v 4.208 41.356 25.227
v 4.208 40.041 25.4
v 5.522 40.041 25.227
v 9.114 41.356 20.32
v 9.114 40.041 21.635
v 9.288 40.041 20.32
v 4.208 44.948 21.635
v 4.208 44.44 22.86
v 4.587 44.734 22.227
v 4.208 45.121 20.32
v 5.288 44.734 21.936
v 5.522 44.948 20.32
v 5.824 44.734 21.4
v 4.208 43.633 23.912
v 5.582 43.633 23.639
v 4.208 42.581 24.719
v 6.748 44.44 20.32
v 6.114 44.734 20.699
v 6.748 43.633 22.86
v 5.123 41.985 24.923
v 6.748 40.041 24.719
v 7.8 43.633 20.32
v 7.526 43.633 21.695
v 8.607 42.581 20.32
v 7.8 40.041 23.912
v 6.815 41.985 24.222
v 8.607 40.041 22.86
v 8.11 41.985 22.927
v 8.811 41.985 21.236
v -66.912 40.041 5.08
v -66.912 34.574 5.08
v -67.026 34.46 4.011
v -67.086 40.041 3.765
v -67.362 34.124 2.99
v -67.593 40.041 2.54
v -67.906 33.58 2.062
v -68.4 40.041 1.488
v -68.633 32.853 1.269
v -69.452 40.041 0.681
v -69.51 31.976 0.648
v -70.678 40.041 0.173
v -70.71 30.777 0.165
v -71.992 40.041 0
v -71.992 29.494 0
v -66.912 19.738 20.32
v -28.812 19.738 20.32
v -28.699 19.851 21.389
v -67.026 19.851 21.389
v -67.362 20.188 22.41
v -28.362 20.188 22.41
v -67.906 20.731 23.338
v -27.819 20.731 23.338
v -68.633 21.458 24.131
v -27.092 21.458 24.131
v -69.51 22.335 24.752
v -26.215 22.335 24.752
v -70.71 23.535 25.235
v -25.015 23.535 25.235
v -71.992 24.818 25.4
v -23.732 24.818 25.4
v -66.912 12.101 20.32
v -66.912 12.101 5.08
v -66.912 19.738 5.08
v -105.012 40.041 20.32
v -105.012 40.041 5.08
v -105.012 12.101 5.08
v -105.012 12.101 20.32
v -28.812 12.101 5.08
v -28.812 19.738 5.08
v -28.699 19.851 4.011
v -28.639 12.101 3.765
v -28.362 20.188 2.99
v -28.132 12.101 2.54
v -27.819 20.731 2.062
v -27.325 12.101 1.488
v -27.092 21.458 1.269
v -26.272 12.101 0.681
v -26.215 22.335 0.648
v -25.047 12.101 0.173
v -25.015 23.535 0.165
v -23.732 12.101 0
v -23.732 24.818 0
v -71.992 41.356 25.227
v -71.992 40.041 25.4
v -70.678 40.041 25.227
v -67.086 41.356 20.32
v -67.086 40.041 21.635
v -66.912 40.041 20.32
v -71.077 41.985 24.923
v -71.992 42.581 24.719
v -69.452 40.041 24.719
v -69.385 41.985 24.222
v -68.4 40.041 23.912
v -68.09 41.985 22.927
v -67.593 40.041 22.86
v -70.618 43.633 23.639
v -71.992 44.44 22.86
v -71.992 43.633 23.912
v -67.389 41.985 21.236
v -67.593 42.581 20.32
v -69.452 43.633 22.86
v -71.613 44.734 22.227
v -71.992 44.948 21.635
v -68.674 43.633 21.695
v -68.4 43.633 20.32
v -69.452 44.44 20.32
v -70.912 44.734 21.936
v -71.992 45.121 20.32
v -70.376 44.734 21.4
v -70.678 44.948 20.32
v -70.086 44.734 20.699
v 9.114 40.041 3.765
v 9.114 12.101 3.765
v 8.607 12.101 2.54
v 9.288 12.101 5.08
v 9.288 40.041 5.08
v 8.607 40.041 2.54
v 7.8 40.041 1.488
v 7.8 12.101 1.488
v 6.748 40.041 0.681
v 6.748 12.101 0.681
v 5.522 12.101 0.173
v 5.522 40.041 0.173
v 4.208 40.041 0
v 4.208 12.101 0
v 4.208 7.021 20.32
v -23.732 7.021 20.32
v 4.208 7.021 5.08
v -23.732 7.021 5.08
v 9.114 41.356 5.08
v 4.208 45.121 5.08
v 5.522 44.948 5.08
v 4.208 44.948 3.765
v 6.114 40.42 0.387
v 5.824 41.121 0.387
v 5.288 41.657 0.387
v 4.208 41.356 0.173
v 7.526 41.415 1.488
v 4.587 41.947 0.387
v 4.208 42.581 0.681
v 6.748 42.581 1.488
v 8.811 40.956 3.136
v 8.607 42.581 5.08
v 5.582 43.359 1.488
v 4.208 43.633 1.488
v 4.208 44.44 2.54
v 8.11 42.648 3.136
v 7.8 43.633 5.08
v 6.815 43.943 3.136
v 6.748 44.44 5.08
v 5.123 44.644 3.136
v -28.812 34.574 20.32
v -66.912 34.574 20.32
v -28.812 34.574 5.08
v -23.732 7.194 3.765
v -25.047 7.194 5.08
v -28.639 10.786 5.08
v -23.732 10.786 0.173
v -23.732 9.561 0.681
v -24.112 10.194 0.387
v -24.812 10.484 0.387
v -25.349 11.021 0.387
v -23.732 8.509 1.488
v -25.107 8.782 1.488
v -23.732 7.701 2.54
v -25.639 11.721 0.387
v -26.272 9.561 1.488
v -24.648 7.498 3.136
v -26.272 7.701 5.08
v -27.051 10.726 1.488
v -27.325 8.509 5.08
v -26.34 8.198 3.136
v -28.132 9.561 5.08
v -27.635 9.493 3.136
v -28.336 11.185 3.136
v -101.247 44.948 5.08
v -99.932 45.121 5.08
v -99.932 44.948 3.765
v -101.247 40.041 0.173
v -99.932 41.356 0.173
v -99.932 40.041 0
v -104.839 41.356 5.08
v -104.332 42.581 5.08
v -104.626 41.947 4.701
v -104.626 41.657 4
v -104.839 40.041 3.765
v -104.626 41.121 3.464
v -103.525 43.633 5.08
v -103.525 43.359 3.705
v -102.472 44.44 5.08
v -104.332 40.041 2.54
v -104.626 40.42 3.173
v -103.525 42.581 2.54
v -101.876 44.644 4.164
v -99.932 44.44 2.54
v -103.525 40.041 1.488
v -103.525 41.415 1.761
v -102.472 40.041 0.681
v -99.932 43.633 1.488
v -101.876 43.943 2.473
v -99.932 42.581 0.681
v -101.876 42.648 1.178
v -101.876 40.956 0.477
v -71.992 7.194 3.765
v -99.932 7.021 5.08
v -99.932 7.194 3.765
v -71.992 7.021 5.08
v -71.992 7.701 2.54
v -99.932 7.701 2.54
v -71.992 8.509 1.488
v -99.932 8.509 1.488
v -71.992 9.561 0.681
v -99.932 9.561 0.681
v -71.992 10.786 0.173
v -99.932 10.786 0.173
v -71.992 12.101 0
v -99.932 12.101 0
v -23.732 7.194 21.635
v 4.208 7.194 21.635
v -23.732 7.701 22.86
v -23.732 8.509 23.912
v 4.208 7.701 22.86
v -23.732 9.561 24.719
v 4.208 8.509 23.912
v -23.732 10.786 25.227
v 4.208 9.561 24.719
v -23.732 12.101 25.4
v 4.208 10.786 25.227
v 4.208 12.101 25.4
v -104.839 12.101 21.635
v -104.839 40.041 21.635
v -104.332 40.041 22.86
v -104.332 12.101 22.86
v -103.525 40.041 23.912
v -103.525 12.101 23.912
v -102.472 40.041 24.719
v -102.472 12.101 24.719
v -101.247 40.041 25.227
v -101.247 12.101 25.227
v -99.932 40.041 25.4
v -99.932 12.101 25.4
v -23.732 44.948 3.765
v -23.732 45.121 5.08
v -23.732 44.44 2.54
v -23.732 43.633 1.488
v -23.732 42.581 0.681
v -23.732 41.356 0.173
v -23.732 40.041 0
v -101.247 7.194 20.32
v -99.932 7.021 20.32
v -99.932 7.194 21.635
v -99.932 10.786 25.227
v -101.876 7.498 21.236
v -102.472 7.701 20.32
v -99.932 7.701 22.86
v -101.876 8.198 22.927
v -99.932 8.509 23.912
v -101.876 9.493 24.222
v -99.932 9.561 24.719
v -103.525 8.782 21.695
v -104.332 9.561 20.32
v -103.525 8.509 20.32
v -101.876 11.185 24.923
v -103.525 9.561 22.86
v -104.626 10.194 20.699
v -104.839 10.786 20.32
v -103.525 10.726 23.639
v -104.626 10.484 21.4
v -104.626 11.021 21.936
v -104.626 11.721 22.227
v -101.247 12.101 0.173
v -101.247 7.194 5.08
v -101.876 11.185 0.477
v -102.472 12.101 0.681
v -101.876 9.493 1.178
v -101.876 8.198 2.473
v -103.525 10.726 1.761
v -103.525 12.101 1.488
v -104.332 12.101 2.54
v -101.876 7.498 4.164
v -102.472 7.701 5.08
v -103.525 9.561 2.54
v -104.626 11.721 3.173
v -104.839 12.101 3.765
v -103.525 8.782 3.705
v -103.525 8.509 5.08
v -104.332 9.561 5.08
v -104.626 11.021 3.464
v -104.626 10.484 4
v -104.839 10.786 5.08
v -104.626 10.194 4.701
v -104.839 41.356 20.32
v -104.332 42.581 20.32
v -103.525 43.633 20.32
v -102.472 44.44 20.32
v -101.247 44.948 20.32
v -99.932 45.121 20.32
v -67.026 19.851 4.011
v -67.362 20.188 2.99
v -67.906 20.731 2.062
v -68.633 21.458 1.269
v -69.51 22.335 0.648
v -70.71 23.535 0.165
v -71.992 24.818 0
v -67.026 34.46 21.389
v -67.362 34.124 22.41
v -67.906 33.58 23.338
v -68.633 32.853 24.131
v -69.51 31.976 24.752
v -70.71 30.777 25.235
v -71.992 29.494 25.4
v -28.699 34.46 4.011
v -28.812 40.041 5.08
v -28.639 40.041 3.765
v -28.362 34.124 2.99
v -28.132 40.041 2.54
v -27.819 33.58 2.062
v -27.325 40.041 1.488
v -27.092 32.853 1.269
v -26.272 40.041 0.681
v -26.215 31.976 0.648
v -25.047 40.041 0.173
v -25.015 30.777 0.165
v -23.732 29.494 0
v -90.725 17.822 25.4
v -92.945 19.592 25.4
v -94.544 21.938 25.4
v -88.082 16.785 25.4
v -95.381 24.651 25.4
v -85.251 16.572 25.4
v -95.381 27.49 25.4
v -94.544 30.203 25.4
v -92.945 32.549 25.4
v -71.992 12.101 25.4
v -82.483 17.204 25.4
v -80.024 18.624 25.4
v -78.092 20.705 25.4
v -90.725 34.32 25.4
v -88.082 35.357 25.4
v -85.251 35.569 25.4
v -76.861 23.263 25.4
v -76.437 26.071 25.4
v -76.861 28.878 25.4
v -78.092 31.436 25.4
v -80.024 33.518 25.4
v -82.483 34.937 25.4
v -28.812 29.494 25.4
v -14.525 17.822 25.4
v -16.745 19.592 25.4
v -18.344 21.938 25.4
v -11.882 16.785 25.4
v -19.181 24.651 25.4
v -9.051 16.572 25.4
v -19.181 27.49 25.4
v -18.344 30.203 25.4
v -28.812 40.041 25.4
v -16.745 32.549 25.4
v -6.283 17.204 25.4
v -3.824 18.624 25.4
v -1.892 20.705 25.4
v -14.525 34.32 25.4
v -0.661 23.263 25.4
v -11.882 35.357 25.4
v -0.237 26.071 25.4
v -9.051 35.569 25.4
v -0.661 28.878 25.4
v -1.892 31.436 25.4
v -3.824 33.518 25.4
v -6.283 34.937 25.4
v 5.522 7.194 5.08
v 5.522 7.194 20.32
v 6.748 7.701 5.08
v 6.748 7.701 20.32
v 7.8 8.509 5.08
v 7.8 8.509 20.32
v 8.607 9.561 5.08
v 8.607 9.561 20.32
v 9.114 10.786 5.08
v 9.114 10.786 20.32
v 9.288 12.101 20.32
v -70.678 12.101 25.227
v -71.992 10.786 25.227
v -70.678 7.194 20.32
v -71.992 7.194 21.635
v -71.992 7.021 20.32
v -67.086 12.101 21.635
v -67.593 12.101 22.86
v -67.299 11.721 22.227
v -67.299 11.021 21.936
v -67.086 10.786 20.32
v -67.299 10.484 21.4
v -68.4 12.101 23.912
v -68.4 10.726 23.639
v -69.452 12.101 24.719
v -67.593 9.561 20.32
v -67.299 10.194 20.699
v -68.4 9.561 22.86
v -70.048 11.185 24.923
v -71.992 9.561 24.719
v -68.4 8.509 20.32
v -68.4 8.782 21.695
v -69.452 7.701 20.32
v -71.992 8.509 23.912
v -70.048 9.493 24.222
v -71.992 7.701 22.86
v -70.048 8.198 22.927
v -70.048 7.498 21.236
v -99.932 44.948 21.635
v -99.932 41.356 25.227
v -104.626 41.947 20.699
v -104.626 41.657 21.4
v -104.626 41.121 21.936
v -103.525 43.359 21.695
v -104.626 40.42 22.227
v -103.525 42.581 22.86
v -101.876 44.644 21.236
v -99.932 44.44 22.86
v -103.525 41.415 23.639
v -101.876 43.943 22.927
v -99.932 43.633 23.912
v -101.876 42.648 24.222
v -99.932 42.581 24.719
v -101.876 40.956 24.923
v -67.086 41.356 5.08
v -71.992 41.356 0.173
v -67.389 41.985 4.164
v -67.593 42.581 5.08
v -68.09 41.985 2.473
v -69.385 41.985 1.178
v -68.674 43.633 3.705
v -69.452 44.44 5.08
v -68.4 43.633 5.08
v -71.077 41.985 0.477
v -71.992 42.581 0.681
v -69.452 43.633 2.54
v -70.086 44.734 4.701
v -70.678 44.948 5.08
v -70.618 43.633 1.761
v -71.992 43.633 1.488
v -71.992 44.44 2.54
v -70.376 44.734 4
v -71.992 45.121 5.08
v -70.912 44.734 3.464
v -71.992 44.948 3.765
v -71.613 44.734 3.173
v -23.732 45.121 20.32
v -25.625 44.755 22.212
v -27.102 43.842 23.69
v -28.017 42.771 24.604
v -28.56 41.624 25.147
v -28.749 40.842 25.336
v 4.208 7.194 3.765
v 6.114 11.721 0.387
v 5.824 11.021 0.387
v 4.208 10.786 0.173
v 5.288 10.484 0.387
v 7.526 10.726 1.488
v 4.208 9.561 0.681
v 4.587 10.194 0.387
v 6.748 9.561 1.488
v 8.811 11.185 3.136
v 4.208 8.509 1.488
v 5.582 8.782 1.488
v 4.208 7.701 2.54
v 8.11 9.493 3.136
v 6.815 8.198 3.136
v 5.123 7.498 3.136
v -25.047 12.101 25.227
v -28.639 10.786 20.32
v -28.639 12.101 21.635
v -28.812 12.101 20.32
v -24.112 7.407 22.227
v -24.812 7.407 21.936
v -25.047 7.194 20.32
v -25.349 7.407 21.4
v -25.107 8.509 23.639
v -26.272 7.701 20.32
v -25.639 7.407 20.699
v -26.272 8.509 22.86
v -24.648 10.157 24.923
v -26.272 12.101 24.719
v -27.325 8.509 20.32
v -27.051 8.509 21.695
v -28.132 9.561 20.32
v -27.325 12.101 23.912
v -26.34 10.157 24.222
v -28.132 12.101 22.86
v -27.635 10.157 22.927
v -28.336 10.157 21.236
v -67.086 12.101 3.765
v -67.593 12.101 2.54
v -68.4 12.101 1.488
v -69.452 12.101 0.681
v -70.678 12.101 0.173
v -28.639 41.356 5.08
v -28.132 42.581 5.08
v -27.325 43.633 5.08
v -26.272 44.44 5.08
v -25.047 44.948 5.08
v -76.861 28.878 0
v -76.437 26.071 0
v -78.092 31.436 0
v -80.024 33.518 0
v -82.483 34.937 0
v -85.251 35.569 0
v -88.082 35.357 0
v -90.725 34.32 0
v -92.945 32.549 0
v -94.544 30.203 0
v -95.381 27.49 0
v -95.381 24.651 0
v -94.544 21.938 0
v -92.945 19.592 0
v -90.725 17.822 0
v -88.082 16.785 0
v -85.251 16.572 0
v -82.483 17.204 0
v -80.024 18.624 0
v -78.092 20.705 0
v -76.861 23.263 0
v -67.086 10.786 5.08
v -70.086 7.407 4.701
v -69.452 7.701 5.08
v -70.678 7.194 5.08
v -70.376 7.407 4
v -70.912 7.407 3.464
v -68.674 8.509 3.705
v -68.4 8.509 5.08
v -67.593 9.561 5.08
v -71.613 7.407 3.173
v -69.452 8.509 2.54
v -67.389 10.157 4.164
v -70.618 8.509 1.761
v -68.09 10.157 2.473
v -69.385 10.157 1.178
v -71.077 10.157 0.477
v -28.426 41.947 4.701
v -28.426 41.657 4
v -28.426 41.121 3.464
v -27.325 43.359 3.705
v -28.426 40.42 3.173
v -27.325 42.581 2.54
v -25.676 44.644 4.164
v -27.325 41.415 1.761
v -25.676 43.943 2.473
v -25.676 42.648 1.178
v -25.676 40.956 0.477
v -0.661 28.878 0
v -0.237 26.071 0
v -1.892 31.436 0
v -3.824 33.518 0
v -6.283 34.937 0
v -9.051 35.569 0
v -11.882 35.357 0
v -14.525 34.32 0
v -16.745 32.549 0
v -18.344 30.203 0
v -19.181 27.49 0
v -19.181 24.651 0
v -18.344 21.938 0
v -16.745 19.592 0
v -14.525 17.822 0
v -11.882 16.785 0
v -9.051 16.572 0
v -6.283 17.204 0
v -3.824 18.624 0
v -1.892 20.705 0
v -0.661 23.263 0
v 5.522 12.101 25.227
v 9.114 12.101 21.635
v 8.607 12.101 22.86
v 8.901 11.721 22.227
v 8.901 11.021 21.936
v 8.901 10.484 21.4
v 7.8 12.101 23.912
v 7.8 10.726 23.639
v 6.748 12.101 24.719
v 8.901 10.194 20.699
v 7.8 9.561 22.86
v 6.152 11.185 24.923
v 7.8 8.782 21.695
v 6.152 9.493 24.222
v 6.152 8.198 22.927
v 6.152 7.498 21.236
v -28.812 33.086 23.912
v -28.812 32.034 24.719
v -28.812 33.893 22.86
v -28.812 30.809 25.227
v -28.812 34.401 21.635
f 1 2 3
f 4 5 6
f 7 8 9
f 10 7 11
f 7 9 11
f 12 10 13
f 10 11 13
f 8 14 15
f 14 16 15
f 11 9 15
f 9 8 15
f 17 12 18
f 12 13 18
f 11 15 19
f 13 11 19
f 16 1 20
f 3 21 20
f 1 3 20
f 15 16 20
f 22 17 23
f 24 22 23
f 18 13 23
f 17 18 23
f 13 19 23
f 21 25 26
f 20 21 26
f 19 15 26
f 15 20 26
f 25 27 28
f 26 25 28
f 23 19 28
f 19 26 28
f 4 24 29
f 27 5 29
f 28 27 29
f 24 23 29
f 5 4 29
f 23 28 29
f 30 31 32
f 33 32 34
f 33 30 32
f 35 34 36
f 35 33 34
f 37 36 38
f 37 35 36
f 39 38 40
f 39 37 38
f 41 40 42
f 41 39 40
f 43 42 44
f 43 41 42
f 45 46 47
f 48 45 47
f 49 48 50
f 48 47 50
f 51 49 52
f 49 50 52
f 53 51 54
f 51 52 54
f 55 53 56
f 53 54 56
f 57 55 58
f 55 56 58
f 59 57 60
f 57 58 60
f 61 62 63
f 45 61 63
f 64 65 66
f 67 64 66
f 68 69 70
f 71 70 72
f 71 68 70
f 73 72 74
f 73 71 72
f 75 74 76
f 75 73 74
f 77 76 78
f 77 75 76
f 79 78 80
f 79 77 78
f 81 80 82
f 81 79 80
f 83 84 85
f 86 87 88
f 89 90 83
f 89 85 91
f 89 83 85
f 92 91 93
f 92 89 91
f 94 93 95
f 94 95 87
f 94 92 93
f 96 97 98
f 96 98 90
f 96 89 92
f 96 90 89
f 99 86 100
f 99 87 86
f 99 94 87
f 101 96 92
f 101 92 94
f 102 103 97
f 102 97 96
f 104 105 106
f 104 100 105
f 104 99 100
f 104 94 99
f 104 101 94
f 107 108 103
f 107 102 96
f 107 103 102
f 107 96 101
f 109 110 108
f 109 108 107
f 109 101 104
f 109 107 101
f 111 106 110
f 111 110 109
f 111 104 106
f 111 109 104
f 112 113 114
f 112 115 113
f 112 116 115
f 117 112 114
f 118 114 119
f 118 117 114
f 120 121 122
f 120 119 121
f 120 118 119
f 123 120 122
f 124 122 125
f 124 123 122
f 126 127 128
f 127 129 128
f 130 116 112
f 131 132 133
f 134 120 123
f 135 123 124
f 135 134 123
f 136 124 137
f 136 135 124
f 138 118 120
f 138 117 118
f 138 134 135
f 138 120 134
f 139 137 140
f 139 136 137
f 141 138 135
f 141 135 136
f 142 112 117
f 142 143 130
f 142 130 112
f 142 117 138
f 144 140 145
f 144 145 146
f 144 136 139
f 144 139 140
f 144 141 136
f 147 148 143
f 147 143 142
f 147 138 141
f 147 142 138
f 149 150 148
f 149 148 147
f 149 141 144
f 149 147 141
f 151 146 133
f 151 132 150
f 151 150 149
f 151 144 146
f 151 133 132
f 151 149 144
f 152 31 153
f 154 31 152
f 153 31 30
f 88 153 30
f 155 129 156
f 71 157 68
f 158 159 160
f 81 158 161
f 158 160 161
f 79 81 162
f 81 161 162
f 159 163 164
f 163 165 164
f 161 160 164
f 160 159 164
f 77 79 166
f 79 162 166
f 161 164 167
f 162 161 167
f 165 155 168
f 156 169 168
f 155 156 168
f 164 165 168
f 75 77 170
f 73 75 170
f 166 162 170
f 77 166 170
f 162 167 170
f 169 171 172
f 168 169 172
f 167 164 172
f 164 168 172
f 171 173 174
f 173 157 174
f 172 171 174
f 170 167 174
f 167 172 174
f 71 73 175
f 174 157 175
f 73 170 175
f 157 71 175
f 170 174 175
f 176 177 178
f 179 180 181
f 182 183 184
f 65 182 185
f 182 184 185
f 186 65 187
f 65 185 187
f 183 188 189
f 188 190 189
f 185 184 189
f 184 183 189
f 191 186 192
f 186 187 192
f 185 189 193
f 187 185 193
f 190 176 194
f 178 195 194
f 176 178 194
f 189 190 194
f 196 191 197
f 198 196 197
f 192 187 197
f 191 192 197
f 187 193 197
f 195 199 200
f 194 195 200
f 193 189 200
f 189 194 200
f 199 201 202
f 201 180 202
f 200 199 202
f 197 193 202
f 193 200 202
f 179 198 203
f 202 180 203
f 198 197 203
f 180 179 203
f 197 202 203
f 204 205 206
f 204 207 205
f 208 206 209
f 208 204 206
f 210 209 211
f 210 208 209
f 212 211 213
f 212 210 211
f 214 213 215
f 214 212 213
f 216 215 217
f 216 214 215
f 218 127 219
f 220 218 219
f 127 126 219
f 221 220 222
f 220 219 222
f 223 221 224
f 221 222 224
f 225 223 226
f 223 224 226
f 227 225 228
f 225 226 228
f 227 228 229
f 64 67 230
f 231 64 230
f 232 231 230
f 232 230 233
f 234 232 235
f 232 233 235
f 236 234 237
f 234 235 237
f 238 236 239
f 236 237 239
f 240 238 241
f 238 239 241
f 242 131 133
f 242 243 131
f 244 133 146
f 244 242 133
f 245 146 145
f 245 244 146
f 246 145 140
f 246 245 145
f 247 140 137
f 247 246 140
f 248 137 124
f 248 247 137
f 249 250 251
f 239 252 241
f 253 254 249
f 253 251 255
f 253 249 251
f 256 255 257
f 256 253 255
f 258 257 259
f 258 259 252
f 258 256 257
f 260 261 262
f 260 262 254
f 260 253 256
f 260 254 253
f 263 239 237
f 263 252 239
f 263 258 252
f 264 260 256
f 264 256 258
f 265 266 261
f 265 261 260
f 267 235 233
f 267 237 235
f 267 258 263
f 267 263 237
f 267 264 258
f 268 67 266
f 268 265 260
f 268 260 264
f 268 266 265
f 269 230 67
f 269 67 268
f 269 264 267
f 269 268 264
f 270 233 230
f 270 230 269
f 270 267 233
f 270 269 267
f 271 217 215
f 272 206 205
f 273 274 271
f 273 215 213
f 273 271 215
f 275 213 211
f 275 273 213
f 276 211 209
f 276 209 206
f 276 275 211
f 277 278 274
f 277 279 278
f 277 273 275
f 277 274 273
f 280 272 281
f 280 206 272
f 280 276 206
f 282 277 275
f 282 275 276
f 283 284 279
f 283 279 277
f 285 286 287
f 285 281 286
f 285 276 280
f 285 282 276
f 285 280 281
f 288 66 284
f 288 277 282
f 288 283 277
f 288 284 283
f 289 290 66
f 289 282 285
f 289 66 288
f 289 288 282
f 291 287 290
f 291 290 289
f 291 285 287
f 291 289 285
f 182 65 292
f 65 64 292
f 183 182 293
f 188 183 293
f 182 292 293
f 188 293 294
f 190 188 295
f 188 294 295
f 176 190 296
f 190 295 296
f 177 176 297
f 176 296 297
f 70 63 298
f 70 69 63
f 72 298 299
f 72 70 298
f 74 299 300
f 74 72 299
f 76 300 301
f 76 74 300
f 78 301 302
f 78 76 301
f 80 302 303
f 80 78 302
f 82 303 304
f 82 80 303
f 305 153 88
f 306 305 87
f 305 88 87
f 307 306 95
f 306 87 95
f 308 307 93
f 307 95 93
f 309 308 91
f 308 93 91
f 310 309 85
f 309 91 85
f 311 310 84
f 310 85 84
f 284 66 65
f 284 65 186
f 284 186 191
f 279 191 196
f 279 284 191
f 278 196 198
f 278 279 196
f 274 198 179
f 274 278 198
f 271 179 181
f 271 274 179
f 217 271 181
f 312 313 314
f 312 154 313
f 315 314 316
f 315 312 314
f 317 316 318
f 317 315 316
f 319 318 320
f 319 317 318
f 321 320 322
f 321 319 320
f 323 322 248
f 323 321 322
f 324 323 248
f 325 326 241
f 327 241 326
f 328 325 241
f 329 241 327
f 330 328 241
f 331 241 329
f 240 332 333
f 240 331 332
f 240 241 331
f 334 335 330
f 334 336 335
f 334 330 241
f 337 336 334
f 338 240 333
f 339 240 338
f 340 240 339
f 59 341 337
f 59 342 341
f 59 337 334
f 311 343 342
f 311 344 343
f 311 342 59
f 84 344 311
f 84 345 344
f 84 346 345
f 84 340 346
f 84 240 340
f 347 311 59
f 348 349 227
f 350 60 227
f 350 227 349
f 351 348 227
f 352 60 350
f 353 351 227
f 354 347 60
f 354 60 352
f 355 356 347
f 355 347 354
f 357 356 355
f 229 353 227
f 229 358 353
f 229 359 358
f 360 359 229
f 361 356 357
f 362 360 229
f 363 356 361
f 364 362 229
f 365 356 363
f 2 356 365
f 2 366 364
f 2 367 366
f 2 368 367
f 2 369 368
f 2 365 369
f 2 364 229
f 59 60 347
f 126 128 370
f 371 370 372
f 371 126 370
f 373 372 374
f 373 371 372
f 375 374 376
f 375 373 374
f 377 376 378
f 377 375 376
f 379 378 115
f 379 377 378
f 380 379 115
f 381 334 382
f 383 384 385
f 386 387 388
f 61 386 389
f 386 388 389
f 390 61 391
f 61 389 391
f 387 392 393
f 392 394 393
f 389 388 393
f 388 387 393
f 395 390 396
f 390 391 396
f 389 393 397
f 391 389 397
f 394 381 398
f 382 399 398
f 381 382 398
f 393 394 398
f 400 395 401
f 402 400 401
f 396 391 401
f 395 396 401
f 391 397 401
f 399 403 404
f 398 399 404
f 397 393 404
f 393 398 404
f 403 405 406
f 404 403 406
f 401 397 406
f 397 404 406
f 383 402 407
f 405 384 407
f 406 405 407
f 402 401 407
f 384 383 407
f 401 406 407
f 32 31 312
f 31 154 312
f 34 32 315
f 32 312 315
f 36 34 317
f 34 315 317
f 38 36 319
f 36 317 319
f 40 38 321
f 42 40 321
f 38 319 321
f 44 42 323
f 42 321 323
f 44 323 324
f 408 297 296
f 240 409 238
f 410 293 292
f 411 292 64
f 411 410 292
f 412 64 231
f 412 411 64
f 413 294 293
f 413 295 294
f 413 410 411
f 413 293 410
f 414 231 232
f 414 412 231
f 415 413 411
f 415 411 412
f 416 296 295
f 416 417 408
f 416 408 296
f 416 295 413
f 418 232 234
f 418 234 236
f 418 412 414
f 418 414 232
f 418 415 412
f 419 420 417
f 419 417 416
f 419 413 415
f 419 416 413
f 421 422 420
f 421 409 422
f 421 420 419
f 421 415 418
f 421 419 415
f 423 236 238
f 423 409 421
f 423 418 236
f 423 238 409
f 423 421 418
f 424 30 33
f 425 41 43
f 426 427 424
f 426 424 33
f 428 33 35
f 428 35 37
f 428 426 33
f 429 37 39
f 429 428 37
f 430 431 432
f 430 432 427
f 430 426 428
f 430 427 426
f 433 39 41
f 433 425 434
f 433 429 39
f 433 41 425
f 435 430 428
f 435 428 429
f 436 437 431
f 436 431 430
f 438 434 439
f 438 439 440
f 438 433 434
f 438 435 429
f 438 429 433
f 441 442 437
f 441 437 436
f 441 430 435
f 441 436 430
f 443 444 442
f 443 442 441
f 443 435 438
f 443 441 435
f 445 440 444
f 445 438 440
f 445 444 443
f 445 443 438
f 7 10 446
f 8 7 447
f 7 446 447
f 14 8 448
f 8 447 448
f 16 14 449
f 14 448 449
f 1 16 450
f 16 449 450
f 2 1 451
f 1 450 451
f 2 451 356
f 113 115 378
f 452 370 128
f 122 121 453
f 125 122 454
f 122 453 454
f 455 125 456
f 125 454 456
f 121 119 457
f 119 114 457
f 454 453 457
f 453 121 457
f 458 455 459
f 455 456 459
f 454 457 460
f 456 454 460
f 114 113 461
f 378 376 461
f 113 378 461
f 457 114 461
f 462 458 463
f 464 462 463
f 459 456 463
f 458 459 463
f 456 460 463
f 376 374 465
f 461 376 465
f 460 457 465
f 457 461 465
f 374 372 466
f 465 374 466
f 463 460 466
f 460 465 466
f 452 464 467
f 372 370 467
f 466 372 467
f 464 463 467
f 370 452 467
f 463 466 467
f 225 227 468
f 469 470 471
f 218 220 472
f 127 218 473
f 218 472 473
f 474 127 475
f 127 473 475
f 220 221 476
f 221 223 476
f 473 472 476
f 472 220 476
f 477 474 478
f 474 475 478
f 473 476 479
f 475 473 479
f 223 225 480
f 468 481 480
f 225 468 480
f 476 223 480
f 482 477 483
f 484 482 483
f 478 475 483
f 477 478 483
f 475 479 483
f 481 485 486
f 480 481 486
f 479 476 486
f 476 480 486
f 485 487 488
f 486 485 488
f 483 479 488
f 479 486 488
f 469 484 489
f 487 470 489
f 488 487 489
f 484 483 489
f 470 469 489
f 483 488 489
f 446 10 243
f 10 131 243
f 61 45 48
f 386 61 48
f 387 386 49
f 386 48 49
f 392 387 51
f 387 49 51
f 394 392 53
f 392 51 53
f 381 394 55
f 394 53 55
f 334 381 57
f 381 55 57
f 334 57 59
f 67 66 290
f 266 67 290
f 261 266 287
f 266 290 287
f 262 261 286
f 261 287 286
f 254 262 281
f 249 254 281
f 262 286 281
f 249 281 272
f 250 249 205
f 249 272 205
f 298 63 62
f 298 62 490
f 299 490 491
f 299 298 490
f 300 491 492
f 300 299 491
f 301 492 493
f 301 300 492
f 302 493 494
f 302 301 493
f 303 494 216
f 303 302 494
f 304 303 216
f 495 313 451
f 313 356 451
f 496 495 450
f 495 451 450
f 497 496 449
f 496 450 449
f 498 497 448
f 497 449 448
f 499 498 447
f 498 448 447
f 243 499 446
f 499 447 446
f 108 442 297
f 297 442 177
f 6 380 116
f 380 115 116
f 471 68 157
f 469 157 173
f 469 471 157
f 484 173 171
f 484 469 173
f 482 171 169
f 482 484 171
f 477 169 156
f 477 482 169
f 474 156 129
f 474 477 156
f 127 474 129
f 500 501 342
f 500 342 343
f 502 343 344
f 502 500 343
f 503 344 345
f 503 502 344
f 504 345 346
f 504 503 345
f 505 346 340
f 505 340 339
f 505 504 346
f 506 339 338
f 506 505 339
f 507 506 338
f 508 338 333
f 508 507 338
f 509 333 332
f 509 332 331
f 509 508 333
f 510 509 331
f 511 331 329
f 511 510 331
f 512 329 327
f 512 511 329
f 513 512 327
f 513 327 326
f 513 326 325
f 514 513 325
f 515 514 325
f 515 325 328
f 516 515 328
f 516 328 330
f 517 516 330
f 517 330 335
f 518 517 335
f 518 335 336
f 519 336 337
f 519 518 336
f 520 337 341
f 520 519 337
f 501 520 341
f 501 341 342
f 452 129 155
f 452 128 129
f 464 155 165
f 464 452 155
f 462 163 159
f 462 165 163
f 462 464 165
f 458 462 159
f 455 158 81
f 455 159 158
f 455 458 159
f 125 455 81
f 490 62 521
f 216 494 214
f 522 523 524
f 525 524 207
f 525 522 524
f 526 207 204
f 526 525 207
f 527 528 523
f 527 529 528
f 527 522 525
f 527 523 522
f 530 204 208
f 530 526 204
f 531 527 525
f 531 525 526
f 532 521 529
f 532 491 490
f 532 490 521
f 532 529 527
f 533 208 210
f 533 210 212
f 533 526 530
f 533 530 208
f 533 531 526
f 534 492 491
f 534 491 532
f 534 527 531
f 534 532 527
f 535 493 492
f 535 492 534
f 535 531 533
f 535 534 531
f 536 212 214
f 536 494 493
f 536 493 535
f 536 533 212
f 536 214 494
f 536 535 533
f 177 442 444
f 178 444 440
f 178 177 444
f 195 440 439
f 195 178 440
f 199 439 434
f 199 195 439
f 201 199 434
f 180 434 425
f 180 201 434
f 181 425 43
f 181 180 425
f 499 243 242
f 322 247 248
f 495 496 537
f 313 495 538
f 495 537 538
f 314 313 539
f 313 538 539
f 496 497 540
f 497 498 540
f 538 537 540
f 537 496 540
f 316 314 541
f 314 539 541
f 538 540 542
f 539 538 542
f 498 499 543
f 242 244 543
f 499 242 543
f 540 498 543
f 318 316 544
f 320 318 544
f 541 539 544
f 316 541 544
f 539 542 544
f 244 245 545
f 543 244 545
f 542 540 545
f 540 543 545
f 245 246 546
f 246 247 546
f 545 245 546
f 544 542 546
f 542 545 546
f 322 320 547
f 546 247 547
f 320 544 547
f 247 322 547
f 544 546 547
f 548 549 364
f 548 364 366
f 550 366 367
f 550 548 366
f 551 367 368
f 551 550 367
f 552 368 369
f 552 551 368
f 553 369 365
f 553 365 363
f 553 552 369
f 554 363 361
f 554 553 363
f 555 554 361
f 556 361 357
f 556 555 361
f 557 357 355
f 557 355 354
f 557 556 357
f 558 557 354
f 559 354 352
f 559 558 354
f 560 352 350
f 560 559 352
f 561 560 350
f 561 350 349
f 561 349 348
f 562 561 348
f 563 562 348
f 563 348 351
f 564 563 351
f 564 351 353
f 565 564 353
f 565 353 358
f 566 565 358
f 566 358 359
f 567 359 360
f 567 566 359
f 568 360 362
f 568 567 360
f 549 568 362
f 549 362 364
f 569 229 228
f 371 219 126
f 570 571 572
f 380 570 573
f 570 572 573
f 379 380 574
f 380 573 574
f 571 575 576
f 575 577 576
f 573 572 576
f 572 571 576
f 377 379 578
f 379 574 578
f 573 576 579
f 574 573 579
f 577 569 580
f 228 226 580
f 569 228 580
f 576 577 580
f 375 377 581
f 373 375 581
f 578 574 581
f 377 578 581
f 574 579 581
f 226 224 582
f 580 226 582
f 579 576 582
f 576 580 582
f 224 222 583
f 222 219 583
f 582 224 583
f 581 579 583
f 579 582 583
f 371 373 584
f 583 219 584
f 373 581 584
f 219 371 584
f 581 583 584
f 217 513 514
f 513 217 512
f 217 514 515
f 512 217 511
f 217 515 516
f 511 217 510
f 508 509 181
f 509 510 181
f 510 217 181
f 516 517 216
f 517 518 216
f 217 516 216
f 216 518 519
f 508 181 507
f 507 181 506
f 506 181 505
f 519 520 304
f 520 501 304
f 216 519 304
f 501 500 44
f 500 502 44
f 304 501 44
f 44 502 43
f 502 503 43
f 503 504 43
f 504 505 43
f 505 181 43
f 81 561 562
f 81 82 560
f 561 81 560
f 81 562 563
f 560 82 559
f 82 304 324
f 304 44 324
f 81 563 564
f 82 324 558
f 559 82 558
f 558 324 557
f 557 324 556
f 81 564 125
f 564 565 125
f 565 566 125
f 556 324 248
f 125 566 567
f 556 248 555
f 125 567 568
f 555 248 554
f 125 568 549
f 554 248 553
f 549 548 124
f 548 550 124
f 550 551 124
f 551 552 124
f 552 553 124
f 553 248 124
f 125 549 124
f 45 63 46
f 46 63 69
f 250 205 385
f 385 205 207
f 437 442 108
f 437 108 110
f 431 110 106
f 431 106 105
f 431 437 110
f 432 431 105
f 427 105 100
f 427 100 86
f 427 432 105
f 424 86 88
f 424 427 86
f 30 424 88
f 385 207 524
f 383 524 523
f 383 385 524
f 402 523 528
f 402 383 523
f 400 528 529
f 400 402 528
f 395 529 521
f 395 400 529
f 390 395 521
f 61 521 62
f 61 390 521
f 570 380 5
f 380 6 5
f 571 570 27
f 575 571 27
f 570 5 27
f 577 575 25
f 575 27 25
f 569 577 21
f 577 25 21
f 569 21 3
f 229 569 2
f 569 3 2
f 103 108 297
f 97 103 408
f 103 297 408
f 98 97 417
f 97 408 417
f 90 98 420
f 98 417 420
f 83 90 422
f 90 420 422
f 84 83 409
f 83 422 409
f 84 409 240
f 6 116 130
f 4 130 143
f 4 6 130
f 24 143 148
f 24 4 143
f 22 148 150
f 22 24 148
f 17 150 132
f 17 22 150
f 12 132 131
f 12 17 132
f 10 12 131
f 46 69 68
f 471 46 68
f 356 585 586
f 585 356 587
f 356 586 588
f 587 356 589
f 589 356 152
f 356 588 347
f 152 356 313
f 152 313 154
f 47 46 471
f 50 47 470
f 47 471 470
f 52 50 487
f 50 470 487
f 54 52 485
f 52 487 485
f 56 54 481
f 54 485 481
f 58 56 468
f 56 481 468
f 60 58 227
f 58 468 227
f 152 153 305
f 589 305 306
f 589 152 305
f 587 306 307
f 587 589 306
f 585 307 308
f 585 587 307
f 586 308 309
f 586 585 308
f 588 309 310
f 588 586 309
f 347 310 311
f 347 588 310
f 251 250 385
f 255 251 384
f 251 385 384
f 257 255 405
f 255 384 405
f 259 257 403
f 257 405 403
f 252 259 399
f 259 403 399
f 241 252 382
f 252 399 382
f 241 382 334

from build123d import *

# Parameters (mm, degrees)
F0_R         = 9.525
F0_W         = 38.1
F0_H         = 14.8362964392
F1_DEPTH     = 25.4
F2_R         = 5.08
F3_T1_DEPTH  = 15.24
F3_S5_W      = 5.08
F3_S5_H      = 5.08
F3_T6_DEPTH  = 5.08
F3_S11_W     = 5.08
F3_S11_H     = 5.08
F3_T12_DEPTH = 5.08
F3_S17_W     = 5.08
F3_S17_H     = 5.08
F3_T18_DEPTH = 5.08
F3_S23_W     = 5.08
F3_S23_H     = 5.08
F3_T24_DEPTH = 5.08


# Not quite as in the source:
# - a fillet or chamfer that OpenCascade refuses, or shapes differently, is made with other operations: its cross-section is extruded or revolved along the edge and cut away or added


with BuildPart() as f1:
    # F0 (on Top) → F1 (new body)
    with BuildSketch(Plane.XY):
        Polygon((-105.0124109644, 7.0207449608), (-66.9124109644, 7.0207449608), (-66.9124109644, 19.73756589), (-66.9124109644, 34.5738623291), (-66.9124109644, 45.1207449608), (-105.0124109644, 45.1207449608), align=None)
        with Locations((-85.9624109644, 26.0707449608)):
            Circle(F0_R, mode=Mode.SUBTRACT)
        with Locations((-47.8624109644, 27.1557141095)):
            Rectangle(F0_W, F0_H)
        Polygon((-28.8124109644, 34.5738623291), (-28.8124109644, 19.73756589), (-28.8124109644, 7.0207449608), (9.2875890356, 7.0207449608), (9.2875890356, 45.1207449608), (-28.8124109644, 45.1207449608), align=None)
        with Locations((-9.7624109644, 26.0707449608)):
            Circle(F0_R, mode=Mode.SUBTRACT)
    extrude(amount=F1_DEPTH)

    # F2
    f2_edges = [f1.edges().sort_by_distance(p)[0] for p in [
        (-85.962411, 45.120745, 25.4),
        (-85.962411, 45.120745, 0),
        (-105.012411, 45.120745, 12.7),
        (-105.012411, 26.070745, 0),
        (-105.012411, 26.070745, 25.4),
        (-85.962411, 7.020745, 25.4),
        (-47.862411, 19.737566, 25.4),
        (-47.862411, 34.573862, 25.4),
        (-66.912411, 39.847304, 25.4),
        (-66.912411, 13.379155, 25.4),
        (-28.812411, 13.379155, 25.4),
        (-9.762411, 7.020745, 25.4),
        (9.287589, 26.070745, 25.4),
        (-9.762411, 45.120745, 25.4),
        (9.287589, 7.020745, 12.7),
        (9.287589, 45.120745, 12.7),
        (9.287589, 26.070745, 0),
        (-47.862411, 19.737566, 0),
        (-66.912411, 13.379155, 0),
        (-66.912411, 7.020745, 12.7),
        (-28.812411, 7.020745, 12.7),
        (-85.962411, 7.020745, 0),
        (-47.862411, 34.573862, 0),
        (-9.762411, 45.120745, 0),
        (-28.812411, 45.120745, 12.7),
        (-28.812411, 39.847304, 0),
        (-66.912411, 39.847304, 0),
        (-9.762411, 7.020745, 0),
        (-28.812411, 13.379155, 0),
    ]]
    fillet(f2_edges, radius=F2_R)

    # F3: fillet of radius 5.08 on 2 edges, made by hand

    # F3_s2 → F3_t1 (cut)
    with BuildSketch(Plane.XY.offset(5.08)):
        with BuildLine():
            ThreePointArc((-71.9924109644, 45.1207449608), (-68.4003085159, 43.6328474092), (-66.9124109644, 40.0407449608))
            Line((-66.9124109644, 40.0407449608), (-66.9124109644, 45.1207449608))
            Line((-66.9124109644, 45.1207449608), (-71.9924109644, 45.1207449608))
        make_face()
        with BuildLine():
            ThreePointArc((-105.0124109644, 12.1007449608), (-103.5245134128, 8.5086425123), (-99.9324109644, 7.0207449608))
            Line((-99.9324109644, 7.0207449608), (-105.0124109644, 7.0207449608))
            Line((-105.0124109644, 7.0207449608), (-105.0124109644, 12.1007449608))
        make_face()
    extrude(amount=F3_T1_DEPTH, mode=Mode.SUBTRACT)


with BuildPart() as f3_tool4:
    # F3_s5 → F3_t6 (new body)
    with BuildSketch(Plane.YZ.offset(-99.9324109644)):
        with Locations((9.5607449608, 2.54)):
            Rectangle(F3_S5_W, F3_S5_H)
    extrude(amount=-F3_T6_DEPTH)

    # F3_s7 → F3_t8 (revolve, cut)
    with BuildSketch(Plane(origin=(-99.9324109644, 12.1007449608, 5.08), x_dir=(0, 0.7071067812, 0.7071067812), z_dir=(0, -0.7071067812, 0.7071067812))):
        with BuildLine():
            ThreePointArc((0, -5.08), (5.08, 0), (0, 5.08))
            Line((0, 5.08), (0, -5.08))
        make_face()
    revolve(axis=Axis((-99.9324109644, 12.1007449608, 5.08), (-1, 0, 0)), mode=Mode.SUBTRACT)


with BuildPart() as f1_1:
    add(f1.part)

    # F3_t3: cut F3_tool4
    add(f3_tool4.part, mode=Mode.SUBTRACT)


with BuildPart() as f3_tool10:
    # F3_s11 → F3_t12 (new body)
    with BuildSketch(Plane.YZ.offset(-99.9324109644)):
        with Locations((9.5607449608, 22.86)):
            Rectangle(F3_S11_W, F3_S11_H)
    extrude(amount=-F3_T12_DEPTH)

    # F3_s13 → F3_t14 (revolve, cut)
    with BuildSketch(Plane(origin=(-99.9324109644, 12.1007449608, 20.32), x_dir=(0, 0.7071067812, -0.7071067812), z_dir=(0, 0.7071067812, 0.7071067812))):
        with BuildLine():
            ThreePointArc((0, -5.08), (5.08, 0), (0, 5.08))
            Line((0, 5.08), (0, -5.08))
        make_face()
    revolve(axis=Axis((-99.9324109644, 12.1007449608, 20.32), (-1, 0, 0)), mode=Mode.SUBTRACT)


with BuildPart() as f1_2:
    add(f1_1.part)

    # F3_t9: cut F3_tool10
    add(f3_tool10.part, mode=Mode.SUBTRACT)


with BuildPart() as f3_tool16:
    # F3_s17 → F3_t18 (new body)
    with BuildSketch(Plane.XZ.offset(-40.0407449608)):
        with Locations((-69.4524109644, 2.54)):
            Rectangle(F3_S17_W, F3_S17_H)
    extrude(amount=-F3_T18_DEPTH)

    # F3_s19 → F3_t20 (revolve, cut)
    with BuildSketch(Plane(origin=(-71.9924109644, 40.0407449608, 5.08), x_dir=(-0.7071067812, 0, 0.7071067812), z_dir=(-0.7071067812, 0, -0.7071067812))):
        with BuildLine():
            ThreePointArc((0, -5.08), (5.08, 0), (0, 5.08))
            Line((0, 5.08), (0, -5.08))
        make_face()
    revolve(axis=Axis((-71.9924109644, 40.0407449608, 5.08), (0, 1, 0)), mode=Mode.SUBTRACT)


with BuildPart() as f1_3:
    add(f1_2.part)

    # F3_t15: cut F3_tool16
    add(f3_tool16.part, mode=Mode.SUBTRACT)


with BuildPart() as f3_tool22:
    # F3_s23 → F3_t24 (new body)
    with BuildSketch(Plane.XZ.offset(-40.0407449608)):
        with Locations((-69.4524109644, 22.86)):
            Rectangle(F3_S23_W, F3_S23_H)
    extrude(amount=-F3_T24_DEPTH)

    # F3_s25 → F3_t26 (revolve, cut)
    with BuildSketch(Plane(origin=(-71.9924109644, 40.0407449608, 20.32), x_dir=(-0.7071067812, 0, -0.7071067812), z_dir=(0.7071067812, 0, -0.7071067812))):
        with BuildLine():
            ThreePointArc((0, -5.08), (5.08, 0), (0, 5.08))
            Line((0, 5.08), (0, -5.08))
        make_face()
    revolve(axis=Axis((-71.9924109644, 40.0407449608, 20.32), (0, 1, 0)), mode=Mode.SUBTRACT)


with BuildPart() as f1_4:
    add(f1_3.part)

    # F3_t21: cut F3_tool22
    add(f3_tool22.part, mode=Mode.SUBTRACT)


solid = f1_4.part
